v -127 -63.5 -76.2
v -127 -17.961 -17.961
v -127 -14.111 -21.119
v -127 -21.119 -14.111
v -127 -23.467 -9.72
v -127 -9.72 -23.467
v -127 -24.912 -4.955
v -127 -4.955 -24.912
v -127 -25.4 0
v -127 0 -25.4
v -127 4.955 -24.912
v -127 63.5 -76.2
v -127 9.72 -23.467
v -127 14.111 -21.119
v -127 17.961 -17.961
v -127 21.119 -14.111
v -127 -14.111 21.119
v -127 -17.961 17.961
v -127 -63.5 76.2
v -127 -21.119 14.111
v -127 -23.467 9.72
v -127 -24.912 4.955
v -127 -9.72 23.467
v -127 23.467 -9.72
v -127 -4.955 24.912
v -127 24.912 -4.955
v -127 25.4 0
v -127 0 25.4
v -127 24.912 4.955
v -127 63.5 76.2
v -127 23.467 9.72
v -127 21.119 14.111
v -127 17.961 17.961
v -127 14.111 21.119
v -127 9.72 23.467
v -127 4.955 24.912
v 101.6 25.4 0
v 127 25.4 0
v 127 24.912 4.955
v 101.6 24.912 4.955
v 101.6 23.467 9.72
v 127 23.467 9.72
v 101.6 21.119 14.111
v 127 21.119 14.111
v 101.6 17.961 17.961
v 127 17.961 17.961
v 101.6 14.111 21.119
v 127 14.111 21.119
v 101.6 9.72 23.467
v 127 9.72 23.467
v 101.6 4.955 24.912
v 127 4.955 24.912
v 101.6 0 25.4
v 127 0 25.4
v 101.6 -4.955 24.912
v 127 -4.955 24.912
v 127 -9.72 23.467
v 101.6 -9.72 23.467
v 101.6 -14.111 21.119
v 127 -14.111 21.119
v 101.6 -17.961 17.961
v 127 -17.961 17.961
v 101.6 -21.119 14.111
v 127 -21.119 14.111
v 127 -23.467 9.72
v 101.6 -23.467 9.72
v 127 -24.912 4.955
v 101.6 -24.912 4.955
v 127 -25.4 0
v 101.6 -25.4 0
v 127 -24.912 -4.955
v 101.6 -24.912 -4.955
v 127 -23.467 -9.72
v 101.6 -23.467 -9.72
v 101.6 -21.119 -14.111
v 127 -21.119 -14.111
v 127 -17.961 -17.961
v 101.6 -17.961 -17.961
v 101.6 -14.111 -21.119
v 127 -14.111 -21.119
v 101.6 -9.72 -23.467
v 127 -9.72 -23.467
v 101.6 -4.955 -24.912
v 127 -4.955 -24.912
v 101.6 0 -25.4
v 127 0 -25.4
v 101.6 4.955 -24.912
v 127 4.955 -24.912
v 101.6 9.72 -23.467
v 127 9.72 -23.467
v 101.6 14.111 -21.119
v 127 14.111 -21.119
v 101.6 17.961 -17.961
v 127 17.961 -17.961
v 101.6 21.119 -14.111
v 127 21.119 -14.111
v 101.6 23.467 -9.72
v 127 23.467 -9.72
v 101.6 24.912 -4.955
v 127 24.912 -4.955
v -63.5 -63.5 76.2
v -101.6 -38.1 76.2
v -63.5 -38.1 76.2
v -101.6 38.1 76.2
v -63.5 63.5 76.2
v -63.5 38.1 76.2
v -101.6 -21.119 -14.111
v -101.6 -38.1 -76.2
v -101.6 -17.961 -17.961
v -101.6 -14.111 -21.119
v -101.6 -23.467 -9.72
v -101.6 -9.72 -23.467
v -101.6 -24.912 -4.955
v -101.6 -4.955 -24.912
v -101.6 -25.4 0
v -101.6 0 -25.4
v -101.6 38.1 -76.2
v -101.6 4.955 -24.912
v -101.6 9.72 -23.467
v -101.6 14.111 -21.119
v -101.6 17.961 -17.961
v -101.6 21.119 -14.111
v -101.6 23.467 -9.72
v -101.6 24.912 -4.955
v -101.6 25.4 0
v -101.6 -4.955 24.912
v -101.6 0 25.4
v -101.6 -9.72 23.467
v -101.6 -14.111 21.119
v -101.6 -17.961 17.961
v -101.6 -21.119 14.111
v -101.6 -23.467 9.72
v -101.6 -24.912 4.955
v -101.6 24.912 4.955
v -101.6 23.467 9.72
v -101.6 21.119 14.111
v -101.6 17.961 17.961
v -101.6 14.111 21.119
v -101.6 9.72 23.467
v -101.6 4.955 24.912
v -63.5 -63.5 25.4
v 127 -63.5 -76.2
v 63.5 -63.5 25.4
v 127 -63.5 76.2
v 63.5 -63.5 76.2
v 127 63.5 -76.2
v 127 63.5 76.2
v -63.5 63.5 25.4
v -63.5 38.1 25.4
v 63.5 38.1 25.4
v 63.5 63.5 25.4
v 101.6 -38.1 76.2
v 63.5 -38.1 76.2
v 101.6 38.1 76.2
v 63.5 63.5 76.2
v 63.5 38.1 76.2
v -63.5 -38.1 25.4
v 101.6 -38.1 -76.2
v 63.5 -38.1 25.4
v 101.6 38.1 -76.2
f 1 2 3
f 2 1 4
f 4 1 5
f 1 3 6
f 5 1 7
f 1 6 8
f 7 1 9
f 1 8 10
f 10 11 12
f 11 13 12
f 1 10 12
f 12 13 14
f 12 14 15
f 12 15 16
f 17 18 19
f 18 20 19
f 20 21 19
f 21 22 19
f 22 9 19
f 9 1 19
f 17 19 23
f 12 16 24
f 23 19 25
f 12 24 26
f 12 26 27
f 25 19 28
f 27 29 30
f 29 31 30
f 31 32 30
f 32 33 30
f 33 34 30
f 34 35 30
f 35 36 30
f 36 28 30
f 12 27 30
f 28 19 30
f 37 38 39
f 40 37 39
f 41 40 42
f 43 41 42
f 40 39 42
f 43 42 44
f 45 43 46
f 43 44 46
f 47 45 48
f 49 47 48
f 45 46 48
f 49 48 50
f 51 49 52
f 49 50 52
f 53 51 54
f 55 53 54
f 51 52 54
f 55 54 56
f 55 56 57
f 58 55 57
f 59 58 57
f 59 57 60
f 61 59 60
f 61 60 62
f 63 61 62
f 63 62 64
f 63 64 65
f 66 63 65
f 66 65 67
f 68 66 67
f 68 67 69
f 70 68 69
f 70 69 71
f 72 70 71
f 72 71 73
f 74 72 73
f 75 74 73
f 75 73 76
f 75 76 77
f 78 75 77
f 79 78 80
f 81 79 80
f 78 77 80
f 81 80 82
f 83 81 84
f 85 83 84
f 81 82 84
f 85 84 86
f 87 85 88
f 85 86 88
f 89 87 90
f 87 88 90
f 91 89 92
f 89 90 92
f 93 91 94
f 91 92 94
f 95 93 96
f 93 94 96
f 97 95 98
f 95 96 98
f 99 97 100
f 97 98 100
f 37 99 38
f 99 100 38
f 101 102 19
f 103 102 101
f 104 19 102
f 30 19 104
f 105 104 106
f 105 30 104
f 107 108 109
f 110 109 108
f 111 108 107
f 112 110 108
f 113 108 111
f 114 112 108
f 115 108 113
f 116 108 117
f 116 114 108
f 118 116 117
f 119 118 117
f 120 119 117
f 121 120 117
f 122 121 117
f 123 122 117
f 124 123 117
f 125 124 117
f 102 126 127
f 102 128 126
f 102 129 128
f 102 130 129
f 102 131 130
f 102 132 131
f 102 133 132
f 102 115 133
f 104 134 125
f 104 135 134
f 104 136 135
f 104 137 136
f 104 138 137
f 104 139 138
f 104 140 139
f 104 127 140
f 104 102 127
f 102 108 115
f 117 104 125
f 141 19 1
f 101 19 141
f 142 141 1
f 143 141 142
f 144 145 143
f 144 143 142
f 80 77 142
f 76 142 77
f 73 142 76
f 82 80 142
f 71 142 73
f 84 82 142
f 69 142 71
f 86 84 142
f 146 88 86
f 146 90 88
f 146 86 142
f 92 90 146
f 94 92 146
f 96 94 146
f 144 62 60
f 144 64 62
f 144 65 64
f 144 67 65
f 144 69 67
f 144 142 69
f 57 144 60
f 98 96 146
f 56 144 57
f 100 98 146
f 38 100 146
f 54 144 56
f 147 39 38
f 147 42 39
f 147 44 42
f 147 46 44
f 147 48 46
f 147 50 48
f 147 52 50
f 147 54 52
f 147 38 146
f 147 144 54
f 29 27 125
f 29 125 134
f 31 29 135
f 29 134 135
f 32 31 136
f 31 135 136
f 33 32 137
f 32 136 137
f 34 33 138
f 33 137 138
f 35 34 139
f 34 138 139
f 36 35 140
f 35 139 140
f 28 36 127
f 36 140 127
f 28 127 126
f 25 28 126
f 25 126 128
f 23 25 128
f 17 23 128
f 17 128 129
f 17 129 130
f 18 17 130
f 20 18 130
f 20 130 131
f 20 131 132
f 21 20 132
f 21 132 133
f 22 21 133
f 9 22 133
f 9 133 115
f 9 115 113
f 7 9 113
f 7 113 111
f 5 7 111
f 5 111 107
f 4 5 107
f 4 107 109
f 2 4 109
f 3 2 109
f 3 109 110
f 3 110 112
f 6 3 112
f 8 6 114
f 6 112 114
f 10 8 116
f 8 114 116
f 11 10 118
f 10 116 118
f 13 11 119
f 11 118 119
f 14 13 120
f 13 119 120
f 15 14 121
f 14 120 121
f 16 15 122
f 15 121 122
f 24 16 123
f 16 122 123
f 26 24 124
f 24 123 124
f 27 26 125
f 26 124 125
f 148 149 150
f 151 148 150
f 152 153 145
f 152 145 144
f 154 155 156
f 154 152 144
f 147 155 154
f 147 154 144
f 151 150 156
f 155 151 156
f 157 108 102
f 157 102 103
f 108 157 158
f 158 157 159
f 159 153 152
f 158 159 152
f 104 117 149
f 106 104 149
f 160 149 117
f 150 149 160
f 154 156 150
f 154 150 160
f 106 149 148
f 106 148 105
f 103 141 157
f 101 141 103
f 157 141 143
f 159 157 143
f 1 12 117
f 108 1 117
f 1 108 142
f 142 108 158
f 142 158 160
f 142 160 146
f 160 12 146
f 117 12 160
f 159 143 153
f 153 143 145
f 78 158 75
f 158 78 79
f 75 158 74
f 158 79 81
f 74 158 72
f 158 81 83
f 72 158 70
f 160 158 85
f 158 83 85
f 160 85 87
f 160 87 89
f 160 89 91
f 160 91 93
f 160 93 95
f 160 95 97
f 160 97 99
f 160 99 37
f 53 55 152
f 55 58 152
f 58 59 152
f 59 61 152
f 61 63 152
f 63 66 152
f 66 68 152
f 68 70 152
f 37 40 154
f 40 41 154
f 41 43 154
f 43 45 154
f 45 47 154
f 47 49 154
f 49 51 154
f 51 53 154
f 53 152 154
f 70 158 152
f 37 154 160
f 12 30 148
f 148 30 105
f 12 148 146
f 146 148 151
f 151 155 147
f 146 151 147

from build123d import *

# Parameters (mm, degrees)
F0_W     = 254
F0_H     = 127
F1_DEPTH = 76.2
F2_W     = 203.2
F2_H     = 76.2
F3_DEPTH = 152.401
F4_W     = 127
F4_H     = 55.738516
F5_DEPTH = 127.001
F6_R     = 25.4
F7_DEPTH = 254.001


with BuildPart() as f1:
    # F0 (on Top) → F1 (new body, symmetric)
    with BuildSketch(Plane.XY):
        Rectangle(F0_W, F0_H)
    extrude(amount=F1_DEPTH, both=True)

    # F2 (on face) → F3 (cut, through all)
    with BuildSketch(Plane.XY.offset(76.2)):
        Rectangle(F2_W, F2_H)
    extrude(amount=-F3_DEPTH, mode=Mode.SUBTRACT)

    # F4 (on face) → F5 (cut, through all)
    with BuildSketch(Plane.XZ.offset(63.5)):
        with Locations((0, 53.269258)):
            Rectangle(F4_W, F4_H)
    extrude(amount=-F5_DEPTH, mode=Mode.SUBTRACT)

    # F6 (on face) → F7 (cut, through all)
    with BuildSketch(Plane.YZ.offset(127)):
        Circle(F6_R)
    extrude(amount=-F7_DEPTH, mode=Mode.SUBTRACT)


solid = f1.part
